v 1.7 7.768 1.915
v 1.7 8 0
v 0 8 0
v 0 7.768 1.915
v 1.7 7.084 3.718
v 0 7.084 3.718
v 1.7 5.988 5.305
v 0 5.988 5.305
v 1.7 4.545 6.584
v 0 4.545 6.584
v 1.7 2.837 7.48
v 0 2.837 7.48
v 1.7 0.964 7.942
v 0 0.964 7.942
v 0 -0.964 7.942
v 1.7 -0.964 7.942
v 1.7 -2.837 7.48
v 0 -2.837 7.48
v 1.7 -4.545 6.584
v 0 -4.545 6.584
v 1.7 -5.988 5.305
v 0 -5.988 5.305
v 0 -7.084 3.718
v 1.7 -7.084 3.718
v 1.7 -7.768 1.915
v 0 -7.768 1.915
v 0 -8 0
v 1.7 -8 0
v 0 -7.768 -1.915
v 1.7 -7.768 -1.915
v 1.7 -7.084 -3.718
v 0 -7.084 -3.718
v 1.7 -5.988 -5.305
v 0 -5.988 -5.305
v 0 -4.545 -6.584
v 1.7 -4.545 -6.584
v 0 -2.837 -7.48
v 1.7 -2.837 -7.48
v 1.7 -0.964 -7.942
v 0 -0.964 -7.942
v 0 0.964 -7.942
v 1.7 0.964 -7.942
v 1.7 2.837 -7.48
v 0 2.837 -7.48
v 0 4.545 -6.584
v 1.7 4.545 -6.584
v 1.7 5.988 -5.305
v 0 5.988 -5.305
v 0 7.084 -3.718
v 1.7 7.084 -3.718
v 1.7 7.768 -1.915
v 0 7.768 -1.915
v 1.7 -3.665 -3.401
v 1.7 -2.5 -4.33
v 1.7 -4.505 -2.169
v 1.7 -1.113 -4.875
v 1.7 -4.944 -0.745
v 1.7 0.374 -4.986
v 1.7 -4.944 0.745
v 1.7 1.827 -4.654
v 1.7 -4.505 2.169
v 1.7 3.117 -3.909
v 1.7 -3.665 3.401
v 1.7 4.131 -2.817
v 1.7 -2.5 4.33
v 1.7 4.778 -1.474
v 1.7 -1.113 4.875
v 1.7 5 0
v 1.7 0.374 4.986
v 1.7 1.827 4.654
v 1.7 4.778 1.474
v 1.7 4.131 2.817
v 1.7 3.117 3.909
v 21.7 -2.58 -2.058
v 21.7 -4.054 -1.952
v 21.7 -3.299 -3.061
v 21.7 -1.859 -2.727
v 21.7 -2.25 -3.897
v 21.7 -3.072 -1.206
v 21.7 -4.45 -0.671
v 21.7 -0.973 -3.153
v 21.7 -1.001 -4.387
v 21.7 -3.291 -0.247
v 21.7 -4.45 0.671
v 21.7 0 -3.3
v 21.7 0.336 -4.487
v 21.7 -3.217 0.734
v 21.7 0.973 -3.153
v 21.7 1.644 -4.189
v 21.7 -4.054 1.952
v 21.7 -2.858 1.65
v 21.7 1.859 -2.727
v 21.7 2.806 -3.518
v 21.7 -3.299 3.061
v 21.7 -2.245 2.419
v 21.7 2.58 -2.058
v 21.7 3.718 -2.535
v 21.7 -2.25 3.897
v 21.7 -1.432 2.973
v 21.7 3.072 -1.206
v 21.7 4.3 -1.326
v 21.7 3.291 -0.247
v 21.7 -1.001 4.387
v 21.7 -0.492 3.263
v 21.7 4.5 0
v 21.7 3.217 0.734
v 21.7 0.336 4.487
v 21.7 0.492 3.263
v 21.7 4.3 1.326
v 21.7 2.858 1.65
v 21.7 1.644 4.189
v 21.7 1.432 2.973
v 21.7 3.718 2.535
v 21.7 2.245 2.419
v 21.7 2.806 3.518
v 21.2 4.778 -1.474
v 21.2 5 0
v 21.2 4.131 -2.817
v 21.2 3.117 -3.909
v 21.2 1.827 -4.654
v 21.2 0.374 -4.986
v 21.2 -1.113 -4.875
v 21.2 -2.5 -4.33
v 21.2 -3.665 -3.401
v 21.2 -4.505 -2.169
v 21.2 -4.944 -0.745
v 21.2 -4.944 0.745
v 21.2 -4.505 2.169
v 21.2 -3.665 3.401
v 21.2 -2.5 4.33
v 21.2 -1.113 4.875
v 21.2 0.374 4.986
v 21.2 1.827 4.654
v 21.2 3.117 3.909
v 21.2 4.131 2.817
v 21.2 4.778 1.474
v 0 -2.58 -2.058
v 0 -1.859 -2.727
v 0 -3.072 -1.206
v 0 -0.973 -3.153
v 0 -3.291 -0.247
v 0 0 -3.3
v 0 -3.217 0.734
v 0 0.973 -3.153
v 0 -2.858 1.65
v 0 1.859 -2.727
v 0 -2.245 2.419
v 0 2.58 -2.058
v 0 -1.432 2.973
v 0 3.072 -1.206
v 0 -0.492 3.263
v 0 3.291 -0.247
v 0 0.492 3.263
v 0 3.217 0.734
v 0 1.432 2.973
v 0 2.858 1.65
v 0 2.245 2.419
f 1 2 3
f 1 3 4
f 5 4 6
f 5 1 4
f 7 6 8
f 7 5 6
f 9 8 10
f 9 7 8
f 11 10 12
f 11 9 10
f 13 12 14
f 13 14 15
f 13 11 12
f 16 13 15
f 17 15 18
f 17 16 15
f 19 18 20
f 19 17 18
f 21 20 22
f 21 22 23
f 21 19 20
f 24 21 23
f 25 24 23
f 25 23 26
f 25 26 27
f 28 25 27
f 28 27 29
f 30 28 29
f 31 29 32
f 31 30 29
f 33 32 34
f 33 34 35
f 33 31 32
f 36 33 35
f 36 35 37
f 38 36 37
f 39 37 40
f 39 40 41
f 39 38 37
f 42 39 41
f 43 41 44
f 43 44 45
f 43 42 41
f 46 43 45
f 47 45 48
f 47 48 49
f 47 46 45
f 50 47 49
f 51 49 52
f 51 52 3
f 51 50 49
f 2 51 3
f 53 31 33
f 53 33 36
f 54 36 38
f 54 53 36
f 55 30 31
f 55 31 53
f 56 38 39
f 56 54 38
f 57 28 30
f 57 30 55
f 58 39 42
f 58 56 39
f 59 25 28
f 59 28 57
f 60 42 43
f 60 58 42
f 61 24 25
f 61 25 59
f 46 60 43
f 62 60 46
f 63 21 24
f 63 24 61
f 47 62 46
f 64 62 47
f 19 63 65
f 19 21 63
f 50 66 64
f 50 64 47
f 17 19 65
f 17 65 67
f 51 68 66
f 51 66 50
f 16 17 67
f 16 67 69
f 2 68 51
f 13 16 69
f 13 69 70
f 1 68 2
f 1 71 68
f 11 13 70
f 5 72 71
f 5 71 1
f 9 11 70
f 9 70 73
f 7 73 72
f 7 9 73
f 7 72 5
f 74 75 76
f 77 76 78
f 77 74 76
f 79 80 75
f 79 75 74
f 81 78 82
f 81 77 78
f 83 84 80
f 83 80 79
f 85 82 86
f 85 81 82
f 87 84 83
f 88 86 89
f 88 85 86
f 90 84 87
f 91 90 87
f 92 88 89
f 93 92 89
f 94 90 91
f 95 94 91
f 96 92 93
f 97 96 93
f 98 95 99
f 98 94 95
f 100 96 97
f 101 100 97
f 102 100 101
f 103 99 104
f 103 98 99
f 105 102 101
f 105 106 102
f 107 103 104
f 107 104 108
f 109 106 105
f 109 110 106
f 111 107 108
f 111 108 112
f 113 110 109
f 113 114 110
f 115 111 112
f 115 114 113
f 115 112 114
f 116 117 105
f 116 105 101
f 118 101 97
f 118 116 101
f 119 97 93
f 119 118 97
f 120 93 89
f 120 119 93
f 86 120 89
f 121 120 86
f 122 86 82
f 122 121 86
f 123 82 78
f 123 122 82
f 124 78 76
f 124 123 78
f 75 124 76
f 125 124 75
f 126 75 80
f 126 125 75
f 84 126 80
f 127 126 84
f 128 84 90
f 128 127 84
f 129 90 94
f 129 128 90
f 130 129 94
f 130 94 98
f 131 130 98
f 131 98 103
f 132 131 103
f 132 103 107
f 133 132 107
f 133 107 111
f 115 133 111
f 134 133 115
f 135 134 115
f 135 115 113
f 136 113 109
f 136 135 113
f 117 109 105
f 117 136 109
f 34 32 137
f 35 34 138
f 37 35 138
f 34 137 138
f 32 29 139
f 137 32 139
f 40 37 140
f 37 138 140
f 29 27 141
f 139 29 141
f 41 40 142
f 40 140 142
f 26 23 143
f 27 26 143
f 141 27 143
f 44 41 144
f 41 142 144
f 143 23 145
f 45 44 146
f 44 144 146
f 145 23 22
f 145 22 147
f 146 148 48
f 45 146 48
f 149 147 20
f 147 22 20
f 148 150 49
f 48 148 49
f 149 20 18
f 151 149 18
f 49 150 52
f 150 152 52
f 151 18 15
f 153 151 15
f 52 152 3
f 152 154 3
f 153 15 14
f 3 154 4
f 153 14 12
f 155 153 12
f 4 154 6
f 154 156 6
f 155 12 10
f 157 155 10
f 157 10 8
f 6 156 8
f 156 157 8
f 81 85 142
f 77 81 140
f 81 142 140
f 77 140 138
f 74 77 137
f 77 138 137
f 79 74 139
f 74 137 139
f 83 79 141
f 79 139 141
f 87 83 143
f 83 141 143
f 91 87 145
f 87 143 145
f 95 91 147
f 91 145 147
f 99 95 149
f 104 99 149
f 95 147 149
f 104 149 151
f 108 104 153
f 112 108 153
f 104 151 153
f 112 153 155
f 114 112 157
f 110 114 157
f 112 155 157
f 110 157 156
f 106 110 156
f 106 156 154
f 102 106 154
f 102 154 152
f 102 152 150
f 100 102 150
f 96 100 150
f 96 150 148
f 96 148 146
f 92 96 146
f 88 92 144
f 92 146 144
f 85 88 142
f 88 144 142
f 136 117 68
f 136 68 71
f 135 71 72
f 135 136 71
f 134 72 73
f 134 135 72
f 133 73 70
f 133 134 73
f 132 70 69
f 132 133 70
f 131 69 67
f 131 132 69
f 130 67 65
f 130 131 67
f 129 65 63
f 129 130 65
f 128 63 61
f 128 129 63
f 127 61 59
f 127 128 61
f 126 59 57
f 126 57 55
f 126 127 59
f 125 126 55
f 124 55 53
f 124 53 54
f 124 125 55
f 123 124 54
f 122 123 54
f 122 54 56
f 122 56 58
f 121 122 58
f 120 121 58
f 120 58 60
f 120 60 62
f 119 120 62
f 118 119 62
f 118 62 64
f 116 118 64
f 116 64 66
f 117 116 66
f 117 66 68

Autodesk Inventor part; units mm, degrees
ref_plane "Płaszczyzna początkowa" through (0, 0, 0) normal (1, 0, 0) x (0, 1, 0)
ref_plane "XZ Plane" through (0, 0, 0) normal (0, 1, 0) x (-1, 0, 0)
ref_plane "XY Plane" through (0, 0, 0) normal (0, 0, 1) x (1, 0, 0)
sketch "Szkic główny" plane through (0, 0, 0) normal (0, 0, 1) x (1, 0, 0)
  line L0 (0, 0) -> (21.7, 0)
  line L1 (0, 0) -> (0, 8)
  line L2 (1.7, 8) -> (1.7, 5)
  line L3 (0, 8) -> (1.7, 8)
  line L4 (21.7, 5) -> (21.7, 0)
  line L5 (1.7, 5) -> (21.7, 5)
  dimension "d3" = 16
  dimension "d4" = 10
revolve "Obrót1" add sketch "Szkic główny" angle 360 about axis through (0, 0, 0) along (1, 0, 0)
chamfer "Faza1" distance 0.5 angle 45 1 edges at (21.7, -5, 0) measured on face at (15.0333, 4.9353, -0.8021)
sketch "Szkic3" plane through (21.7, 0, 0) normal (1, 0, 0) x (0, 0, -1)
  point P0 (0, 0)
hole "Otwór1" at (21.7, 0, 0) direction (-1, 0, 0) diameter 6.6 depth 21.7
sketch "Szkic4" plane through (21.7, 0, 0) normal (1, 0, 0) x (0, 0, -1)
  point P0 (0, 0)
hole "Otwór2" at (21.7, 0, 0) direction (-1, 0, 0) diameter 6.6 depth 21.7
equation "\"Length\" = 21.7"
properties part number "Wał" material "Steel"
